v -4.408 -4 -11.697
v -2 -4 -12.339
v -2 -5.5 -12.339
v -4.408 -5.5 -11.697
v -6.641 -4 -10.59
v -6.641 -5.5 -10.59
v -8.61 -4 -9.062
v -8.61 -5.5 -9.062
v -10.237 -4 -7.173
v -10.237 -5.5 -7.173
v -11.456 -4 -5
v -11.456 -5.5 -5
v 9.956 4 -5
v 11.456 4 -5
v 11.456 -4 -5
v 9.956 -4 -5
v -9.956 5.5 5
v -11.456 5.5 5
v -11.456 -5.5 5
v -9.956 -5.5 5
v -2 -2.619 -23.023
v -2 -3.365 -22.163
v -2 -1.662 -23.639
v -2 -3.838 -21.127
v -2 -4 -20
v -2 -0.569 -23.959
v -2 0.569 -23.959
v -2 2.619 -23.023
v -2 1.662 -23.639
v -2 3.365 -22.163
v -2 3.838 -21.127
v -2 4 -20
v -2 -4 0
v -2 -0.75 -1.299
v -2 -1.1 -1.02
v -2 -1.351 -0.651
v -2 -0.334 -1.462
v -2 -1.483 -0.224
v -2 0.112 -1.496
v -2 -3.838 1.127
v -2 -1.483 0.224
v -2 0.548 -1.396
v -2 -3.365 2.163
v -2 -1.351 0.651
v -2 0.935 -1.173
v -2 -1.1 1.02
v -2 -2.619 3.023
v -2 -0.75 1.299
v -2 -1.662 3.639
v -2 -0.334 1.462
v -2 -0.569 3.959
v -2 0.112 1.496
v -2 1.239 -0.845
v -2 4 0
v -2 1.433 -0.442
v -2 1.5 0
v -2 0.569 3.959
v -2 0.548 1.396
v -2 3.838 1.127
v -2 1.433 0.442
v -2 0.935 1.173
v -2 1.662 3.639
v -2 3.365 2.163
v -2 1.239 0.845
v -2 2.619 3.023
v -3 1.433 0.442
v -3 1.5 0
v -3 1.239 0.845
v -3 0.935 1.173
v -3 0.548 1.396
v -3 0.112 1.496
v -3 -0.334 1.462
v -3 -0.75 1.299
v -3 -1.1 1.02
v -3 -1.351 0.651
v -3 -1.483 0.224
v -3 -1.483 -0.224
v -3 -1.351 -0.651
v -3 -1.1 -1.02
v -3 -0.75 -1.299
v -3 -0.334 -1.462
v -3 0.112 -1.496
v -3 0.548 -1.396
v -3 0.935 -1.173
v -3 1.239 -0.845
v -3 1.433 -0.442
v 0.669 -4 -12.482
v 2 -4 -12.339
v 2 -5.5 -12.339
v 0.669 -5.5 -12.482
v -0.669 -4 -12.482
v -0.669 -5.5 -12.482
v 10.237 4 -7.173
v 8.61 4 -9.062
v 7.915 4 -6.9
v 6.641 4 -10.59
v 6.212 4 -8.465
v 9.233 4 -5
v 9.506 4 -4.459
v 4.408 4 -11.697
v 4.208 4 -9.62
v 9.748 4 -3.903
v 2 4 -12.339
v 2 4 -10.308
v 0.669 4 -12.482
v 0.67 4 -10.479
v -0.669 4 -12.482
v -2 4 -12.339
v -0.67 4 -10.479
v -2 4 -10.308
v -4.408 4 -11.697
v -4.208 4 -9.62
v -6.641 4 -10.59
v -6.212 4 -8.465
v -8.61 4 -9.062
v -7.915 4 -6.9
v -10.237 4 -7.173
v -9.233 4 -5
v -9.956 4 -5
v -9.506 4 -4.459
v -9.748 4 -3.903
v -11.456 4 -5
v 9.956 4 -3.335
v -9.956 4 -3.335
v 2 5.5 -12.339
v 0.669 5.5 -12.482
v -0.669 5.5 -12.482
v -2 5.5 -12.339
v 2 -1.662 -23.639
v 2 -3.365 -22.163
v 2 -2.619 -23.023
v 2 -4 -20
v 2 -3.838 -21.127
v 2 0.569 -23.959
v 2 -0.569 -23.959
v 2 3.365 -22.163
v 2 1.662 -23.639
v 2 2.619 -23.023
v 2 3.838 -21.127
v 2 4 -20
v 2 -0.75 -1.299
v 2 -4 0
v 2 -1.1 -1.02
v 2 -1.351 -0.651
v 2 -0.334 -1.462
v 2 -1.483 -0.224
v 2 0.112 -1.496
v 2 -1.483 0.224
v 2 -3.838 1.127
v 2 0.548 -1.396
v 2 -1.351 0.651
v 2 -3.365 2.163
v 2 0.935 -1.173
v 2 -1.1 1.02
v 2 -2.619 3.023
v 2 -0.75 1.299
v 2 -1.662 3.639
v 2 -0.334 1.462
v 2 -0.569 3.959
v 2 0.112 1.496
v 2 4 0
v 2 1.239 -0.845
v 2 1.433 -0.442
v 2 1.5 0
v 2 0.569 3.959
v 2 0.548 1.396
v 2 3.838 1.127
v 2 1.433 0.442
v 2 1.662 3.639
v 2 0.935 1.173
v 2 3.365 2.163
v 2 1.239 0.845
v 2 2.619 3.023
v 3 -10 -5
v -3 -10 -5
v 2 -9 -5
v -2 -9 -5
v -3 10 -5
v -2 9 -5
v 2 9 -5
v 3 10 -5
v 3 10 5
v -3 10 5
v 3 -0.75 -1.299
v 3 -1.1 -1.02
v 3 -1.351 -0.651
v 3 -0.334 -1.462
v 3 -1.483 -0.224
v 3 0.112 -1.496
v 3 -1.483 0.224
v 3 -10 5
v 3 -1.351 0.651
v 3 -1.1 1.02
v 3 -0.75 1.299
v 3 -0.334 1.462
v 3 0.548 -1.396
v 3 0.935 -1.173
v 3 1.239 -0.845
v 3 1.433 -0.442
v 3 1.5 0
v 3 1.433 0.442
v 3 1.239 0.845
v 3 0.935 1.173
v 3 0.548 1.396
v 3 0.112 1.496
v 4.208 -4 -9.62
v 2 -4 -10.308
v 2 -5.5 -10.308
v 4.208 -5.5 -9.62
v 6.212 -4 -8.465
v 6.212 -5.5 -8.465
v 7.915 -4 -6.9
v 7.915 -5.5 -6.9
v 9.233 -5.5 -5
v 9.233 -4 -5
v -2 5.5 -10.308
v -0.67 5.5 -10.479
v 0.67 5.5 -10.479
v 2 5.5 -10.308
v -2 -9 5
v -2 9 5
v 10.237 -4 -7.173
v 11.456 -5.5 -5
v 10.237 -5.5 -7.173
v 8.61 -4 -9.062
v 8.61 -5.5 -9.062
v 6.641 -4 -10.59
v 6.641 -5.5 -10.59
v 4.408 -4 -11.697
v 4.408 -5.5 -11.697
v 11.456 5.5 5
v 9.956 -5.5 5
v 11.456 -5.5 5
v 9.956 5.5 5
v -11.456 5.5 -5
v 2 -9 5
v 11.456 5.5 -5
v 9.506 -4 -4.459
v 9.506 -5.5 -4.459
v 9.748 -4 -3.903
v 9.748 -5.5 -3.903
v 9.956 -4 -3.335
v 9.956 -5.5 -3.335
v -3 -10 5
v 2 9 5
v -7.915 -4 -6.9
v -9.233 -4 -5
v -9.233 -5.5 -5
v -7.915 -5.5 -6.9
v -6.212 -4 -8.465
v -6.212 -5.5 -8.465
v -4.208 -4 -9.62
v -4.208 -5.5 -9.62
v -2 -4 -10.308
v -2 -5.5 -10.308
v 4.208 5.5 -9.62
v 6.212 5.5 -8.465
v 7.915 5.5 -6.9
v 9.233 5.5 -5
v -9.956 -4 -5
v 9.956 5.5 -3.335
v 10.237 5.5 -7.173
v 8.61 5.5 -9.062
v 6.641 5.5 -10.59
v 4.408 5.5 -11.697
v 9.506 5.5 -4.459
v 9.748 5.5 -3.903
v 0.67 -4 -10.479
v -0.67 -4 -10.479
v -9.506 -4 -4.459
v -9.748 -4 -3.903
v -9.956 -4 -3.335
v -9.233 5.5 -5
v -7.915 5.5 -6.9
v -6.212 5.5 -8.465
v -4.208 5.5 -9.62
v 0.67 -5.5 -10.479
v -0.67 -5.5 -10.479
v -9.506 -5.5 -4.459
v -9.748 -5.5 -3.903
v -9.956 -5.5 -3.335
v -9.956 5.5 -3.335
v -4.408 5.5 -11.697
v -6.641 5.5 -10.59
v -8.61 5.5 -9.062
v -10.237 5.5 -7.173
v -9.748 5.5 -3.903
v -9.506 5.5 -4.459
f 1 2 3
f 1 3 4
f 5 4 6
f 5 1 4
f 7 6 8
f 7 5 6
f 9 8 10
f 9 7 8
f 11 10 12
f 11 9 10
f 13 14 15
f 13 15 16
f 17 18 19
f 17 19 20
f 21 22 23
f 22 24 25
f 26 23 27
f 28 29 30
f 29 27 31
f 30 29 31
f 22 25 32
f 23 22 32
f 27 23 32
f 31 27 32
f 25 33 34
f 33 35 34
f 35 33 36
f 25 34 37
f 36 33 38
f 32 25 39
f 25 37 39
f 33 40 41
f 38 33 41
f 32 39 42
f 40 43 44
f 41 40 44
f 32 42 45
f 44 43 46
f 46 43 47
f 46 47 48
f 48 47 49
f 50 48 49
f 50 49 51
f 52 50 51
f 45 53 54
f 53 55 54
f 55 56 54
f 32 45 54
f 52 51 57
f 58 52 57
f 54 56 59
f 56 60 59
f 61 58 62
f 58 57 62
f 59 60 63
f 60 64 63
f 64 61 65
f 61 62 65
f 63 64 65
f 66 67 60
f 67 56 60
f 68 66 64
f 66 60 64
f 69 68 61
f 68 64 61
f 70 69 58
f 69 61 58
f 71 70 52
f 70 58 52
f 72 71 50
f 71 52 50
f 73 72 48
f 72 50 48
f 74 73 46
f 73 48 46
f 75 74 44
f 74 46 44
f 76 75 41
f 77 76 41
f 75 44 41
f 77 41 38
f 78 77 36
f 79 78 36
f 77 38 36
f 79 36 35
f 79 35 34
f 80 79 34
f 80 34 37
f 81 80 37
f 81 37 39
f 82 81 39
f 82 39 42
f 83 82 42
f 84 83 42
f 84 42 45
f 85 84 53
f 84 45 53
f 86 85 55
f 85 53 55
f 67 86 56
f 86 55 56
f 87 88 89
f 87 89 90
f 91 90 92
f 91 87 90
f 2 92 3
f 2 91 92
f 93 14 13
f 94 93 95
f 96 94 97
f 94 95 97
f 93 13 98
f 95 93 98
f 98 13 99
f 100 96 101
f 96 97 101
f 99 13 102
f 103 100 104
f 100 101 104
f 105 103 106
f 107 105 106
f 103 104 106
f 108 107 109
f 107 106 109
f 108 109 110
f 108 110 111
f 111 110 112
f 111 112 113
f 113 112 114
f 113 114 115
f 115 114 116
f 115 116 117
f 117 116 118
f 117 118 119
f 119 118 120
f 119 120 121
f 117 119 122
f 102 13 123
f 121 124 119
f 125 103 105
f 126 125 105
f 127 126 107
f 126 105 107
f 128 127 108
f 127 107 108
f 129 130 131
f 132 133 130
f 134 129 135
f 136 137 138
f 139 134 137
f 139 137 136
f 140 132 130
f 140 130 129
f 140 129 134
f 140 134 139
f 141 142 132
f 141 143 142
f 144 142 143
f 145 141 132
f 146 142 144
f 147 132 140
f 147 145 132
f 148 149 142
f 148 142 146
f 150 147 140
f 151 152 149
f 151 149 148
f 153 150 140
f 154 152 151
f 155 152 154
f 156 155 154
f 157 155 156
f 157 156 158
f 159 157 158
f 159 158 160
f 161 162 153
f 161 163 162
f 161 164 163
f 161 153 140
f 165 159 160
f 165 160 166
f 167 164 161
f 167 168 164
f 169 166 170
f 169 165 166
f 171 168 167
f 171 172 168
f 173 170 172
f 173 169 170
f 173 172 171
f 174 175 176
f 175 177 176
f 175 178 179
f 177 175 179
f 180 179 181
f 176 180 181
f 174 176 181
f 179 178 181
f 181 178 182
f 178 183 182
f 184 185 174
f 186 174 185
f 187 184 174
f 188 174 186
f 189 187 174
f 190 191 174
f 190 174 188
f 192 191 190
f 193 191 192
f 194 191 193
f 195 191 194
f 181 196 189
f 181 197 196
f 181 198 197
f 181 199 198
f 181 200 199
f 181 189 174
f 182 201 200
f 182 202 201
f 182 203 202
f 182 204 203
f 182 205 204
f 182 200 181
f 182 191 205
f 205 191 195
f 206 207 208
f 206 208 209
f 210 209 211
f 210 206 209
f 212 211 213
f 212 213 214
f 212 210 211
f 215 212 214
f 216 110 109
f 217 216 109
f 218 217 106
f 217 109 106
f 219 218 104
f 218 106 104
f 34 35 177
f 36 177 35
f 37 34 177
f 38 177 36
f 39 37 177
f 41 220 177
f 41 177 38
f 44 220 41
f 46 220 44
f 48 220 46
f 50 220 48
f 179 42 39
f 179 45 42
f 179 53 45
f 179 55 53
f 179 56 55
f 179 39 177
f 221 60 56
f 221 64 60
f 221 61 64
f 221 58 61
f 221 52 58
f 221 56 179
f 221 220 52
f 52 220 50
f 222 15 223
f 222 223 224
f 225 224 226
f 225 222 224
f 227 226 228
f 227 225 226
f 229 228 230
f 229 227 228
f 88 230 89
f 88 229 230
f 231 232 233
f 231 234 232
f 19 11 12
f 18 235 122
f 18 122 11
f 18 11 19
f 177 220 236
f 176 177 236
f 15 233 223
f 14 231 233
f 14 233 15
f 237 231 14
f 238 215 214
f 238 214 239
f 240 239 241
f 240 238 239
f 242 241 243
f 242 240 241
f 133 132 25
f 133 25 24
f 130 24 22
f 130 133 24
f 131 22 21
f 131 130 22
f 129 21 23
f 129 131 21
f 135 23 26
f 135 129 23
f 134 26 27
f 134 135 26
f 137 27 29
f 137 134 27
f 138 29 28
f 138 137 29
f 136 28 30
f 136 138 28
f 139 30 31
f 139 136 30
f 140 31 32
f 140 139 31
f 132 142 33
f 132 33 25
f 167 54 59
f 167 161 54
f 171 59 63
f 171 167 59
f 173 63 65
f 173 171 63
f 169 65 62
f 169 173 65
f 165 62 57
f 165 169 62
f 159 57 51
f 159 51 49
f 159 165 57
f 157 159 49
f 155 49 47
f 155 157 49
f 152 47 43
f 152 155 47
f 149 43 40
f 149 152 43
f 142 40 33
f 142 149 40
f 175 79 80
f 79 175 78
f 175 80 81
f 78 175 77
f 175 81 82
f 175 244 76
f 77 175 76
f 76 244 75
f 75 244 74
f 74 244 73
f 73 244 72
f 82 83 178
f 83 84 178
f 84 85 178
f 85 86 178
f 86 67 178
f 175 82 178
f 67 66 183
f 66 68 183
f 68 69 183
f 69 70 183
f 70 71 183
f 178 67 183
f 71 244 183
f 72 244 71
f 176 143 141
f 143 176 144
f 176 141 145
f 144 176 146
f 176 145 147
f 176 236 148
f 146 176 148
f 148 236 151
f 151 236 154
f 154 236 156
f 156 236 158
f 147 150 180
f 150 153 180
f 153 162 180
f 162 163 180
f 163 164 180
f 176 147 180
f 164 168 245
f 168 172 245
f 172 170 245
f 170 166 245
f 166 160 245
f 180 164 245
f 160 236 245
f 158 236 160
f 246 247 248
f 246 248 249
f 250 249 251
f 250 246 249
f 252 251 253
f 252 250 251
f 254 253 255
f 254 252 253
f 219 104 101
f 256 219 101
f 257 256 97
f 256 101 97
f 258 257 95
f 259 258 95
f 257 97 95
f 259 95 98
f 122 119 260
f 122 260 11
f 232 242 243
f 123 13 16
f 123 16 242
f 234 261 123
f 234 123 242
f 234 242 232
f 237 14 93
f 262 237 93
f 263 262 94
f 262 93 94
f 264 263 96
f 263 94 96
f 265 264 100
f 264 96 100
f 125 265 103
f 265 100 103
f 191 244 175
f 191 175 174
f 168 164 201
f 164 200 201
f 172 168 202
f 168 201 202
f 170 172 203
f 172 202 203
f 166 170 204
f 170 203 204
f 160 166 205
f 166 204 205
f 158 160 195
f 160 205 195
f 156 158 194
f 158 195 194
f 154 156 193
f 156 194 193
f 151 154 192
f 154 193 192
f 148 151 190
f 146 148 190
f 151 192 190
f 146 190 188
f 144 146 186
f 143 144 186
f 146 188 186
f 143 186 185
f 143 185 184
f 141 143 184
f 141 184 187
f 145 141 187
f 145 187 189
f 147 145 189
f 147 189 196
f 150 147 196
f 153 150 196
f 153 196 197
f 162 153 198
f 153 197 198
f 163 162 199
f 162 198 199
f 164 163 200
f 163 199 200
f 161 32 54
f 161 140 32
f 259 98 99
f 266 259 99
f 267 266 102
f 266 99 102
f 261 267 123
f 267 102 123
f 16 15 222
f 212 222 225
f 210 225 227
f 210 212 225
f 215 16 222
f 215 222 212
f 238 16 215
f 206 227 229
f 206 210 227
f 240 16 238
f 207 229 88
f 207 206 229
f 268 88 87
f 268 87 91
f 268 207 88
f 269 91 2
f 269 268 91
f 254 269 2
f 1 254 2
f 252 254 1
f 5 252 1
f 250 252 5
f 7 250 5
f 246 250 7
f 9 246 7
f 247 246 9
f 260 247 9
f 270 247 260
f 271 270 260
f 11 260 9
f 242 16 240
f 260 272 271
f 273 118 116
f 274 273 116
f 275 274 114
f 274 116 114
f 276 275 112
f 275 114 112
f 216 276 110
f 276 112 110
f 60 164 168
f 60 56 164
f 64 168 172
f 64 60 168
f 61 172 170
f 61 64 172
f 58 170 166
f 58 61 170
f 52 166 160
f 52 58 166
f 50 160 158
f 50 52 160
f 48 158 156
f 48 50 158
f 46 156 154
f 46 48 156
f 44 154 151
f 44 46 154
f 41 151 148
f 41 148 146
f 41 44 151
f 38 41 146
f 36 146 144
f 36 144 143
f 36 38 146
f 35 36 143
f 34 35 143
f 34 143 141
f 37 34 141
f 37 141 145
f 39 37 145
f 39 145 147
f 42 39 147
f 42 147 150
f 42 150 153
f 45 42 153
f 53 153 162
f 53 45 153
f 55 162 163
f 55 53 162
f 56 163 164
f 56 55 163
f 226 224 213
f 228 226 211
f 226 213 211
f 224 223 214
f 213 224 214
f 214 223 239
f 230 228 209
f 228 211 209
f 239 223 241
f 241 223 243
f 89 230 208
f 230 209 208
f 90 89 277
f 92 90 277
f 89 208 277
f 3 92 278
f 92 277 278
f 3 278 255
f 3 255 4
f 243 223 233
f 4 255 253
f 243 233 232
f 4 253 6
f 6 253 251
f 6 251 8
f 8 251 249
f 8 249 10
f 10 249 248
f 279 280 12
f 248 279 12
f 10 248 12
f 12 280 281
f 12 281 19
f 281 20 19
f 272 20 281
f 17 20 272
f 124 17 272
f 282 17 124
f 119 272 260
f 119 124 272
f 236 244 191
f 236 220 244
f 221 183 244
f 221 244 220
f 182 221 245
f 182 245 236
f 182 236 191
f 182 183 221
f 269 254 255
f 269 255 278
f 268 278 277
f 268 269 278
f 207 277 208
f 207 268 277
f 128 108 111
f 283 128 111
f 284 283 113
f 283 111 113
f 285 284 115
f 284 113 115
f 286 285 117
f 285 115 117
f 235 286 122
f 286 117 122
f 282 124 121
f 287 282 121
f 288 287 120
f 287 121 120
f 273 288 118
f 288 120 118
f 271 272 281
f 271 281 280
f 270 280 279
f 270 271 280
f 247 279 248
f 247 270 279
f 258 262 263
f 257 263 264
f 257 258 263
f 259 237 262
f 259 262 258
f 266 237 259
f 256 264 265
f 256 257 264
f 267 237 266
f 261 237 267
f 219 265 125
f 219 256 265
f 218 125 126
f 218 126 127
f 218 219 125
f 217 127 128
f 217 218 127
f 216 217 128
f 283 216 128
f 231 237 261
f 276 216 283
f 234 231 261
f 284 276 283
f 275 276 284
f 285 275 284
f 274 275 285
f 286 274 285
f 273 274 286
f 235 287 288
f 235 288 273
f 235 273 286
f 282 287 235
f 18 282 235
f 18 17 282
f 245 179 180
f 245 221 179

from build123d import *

# Parameters (mm, degrees)
F0_R     = 1.5
F1_DEPTH = 2
F2_W     = 6
F2_H     = 20
F2_W_2   = 4
F2_H_2   = 18
F3_DEPTH = 5
F4_DEPTH = 12.5
F6_DEPTH = 1.5
F7_DEPTH = 8
F8_START = -8
F8_DEPTH = 1.5


# Not quite as in the source:
# - a feature names something its author has since deleted; it is built from what else it names


with BuildPart() as f1:
    # F0 (on Right) → F1 (new body, symmetric)
    with BuildSketch(Plane.YZ):
        with BuildLine():
            ThreePointArc((-4, 0), (0, -4), (4, 0))
            ThreePointArc((4, 0), (0, 4), (-4, 0))
        make_face()
        Circle(F0_R, mode=Mode.SUBTRACT)
        with BuildLine():
            Line((4, -20), (4, 0))
            ThreePointArc((4, 0), (0, -4), (-4, 0))
            Line((-4, 0), (-4, -20))
            ThreePointArc((-4, -20), (0, -16), (4, -20))
        make_face()
        with BuildLine():
            ThreePointArc((-4, -20), (0, -24), (4, -20))
            ThreePointArc((4, -20), (0, -16), (-4, -20))
        make_face()
    extrude(amount=F1_DEPTH, both=True)


with BuildPart() as f3:
    # F2 (on Top) → F3 (new body, symmetric)
    with BuildSketch(Plane.XY):
        Rectangle(F2_W, F2_H)
        Rectangle(F2_W_2, F2_H_2, mode=Mode.SUBTRACT)
    extrude(amount=F3_DEPTH, both=True)

    # F0 (on Right) → F4 (cut, symmetric)
    with BuildSketch(Plane.YZ):
        Circle(F0_R)
    extrude(amount=F4_DEPTH, both=True, mode=Mode.SUBTRACT)


with BuildPart() as f6:
    # F5 (on face) → F6 (new body)
    with BuildSketch(Plane(origin=(0, 4, 0), x_dir=(-1, 0, 0), z_dir=(0, 1, 0))):
        with BuildLine():
            ThreePointArc((-9.9564392374, -3.3345640963), (-10.5, 0), (-9.9564392374, 3.3345640963))
            Line((-9.9564392374, 3.3345640963), (-9.9564392374, 5))
            Line((-9.9564392374, 5), (-11.4564392374, 5))
            Line((-11.4564392374, 5), (-11.4564392374, -5))
            Line((-11.4564392374, -5), (-9.9564392374, -5))
            Line((-9.9564392374, -5), (-9.9564392374, -3.3345640963))
        make_face()
        with BuildLine():
            Line((2, -12.3389626793), (2, -10.307764064))
            ThreePointArc((2, -10.307764064), (0, -10.5), (-2, -10.307764064))
            Line((-2, -10.307764064), (-2, -12.3389626793))
            ThreePointArc((-2, -12.3389626793), (0, -12.5), (2, -12.3389626793))
        make_face()
        with BuildLine():
            ThreePointArc((9.9564392374, 3.3345640963), (10.3632189013, 1.6892880168), (10.5, 0))
            ThreePointArc((10.5, 0), (10.3632189013, -1.6892880168), (9.9564392374, -3.3345640963))
            Line((9.9564392374, -3.3345640963), (9.9564392374, -5))
            Line((9.9564392374, -5), (11.4564392374, -5))
            Line((11.4564392374, -5), (11.4564392374, 5))
            Line((11.4564392374, 5), (9.9564392374, 5))
            Line((9.9564392374, 5), (9.9564392374, 3.3345640963))
        make_face()
        with BuildLine():
            ThreePointArc((9.9564392374, -3.3345640963), (10.3632189013, -1.6892880168), (10.5, 0))
            ThreePointArc((10.5, 0), (10.3632189013, 1.6892880168), (9.9564392374, 3.3345640963))
            Line((9.9564392374, 3.3345640963), (9.9564392374, -3.3345640963))
        make_face()
        with BuildLine():
            Line((9.9564392374, -5), (9.2330926563, -5))
            ThreePointArc((9.2330926563, -5), (6.2119789517, -8.4653007923), (2, -10.307764064))
            Line((2, -10.307764064), (2, -12.3389626793))
            ThreePointArc((2, -12.3389626793), (7.6638131853, -9.8750173398), (11.4564392374, -5))
            Line((11.4564392374, -5), (9.9564392374, -5))
        make_face()
        with BuildLine():
            Line((-2, -12.3389626793), (-2, -10.307764064))
            ThreePointArc((-2, -10.307764064), (-6.2119789517, -8.4653007923), (-9.2330926563, -5))
            Line((-9.2330926563, -5), (-9.9564392374, -5))
            Line((-9.9564392374, -5), (-11.4564392374, -5))
            ThreePointArc((-11.4564392374, -5), (-7.6638131853, -9.8750173398), (-2, -12.3389626793))
        make_face()
        with BuildLine():
            ThreePointArc((-9.2330926563, -5), (-9.6308334407, -4.1829471952), (-9.9564392374, -3.3345640963))
            Line((-9.9564392374, -3.3345640963), (-9.9564392374, -5))
            Line((-9.9564392374, -5), (-9.2330926563, -5))
        make_face()
        with BuildLine():
            Line((-9.9564392374, -3.3345640963), (-9.9564392374, 3.3345640963))
            ThreePointArc((-9.9564392374, 3.3345640963), (-10.5, 0), (-9.9564392374, -3.3345640963))
        make_face()
        with BuildLine():
            Line((9.9564392374, -5), (9.9564392374, -3.3345640963))
            ThreePointArc((9.9564392374, -3.3345640963), (9.6308334407, -4.1829471952), (9.2330926563, -5))
            Line((9.2330926563, -5), (9.9564392374, -5))
        make_face()
    extrude(amount=F6_DEPTH)

    # F5 (on face) → F7 (join, through all)
    with BuildSketch(Plane(origin=(0, 4, 0), x_dir=(-1, 0, 0), z_dir=(0, 1, 0))):
        with BuildLine():
            ThreePointArc((9.9564392374, 3.3345640963), (10.3632189013, 1.6892880168), (10.5, 0))
            ThreePointArc((10.5, 0), (10.3632189013, -1.6892880168), (9.9564392374, -3.3345640963))
            Line((9.9564392374, -3.3345640963), (9.9564392374, -5))
            Line((9.9564392374, -5), (11.4564392374, -5))
            Line((11.4564392374, -5), (11.4564392374, 5))
            Line((11.4564392374, 5), (9.9564392374, 5))
            Line((9.9564392374, 5), (9.9564392374, 3.3345640963))
        make_face()
        with BuildLine():
            ThreePointArc((-9.9564392374, -3.3345640963), (-10.5, 0), (-9.9564392374, 3.3345640963))
            Line((-9.9564392374, 3.3345640963), (-9.9564392374, 5))
            Line((-9.9564392374, 5), (-11.4564392374, 5))
            Line((-11.4564392374, 5), (-11.4564392374, -5))
            Line((-11.4564392374, -5), (-9.9564392374, -5))
            Line((-9.9564392374, -5), (-9.9564392374, -3.3345640963))
        make_face()
        with BuildLine():
            ThreePointArc((9.9564392374, -3.3345640963), (10.3632189013, -1.6892880168), (10.5, 0))
            ThreePointArc((10.5, 0), (10.3632189013, 1.6892880168), (9.9564392374, 3.3345640963))
            Line((9.9564392374, 3.3345640963), (9.9564392374, -3.3345640963))
        make_face()
        with BuildLine():
            Line((-9.9564392374, -3.3345640963), (-9.9564392374, 3.3345640963))
            ThreePointArc((-9.9564392374, 3.3345640963), (-10.5, 0), (-9.9564392374, -3.3345640963))
        make_face()
    extrude(amount=-F7_DEPTH)

    # F5 (on face) → F8 (join)
    with BuildSketch(Plane(origin=(0, 4, 0), x_dir=(-1, 0, 0), z_dir=(0, 1, 0)).offset(F8_START)):
        with BuildLine():
            ThreePointArc((-9.9564392374, -3.3345640963), (-10.5, 0), (-9.9564392374, 3.3345640963))
            Line((-9.9564392374, 3.3345640963), (-9.9564392374, 5))
            Line((-9.9564392374, 5), (-11.4564392374, 5))
            Line((-11.4564392374, 5), (-11.4564392374, -5))
            Line((-11.4564392374, -5), (-9.9564392374, -5))
            Line((-9.9564392374, -5), (-9.9564392374, -3.3345640963))
        make_face()
        with BuildLine():
            ThreePointArc((9.9564392374, 3.3345640963), (10.3632189013, 1.6892880168), (10.5, 0))
            ThreePointArc((10.5, 0), (10.3632189013, -1.6892880168), (9.9564392374, -3.3345640963))
            Line((9.9564392374, -3.3345640963), (9.9564392374, -5))
            Line((9.9564392374, -5), (11.4564392374, -5))
            Line((11.4564392374, -5), (11.4564392374, 5))
            Line((11.4564392374, 5), (9.9564392374, 5))
            Line((9.9564392374, 5), (9.9564392374, 3.3345640963))
        make_face()
        with BuildLine():
            Line((9.9564392374, -5), (9.2330926563, -5))
            ThreePointArc((9.2330926563, -5), (6.2119789517, -8.4653007923), (2, -10.307764064))
            Line((2, -10.307764064), (2, -12.3389626793))
            ThreePointArc((2, -12.3389626793), (7.6638131853, -9.8750173398), (11.4564392374, -5))
            Line((11.4564392374, -5), (9.9564392374, -5))
        make_face()
        with BuildLine():
            Line((-2, -12.3389626793), (-2, -10.307764064))
            ThreePointArc((-2, -10.307764064), (-6.2119789517, -8.4653007923), (-9.2330926563, -5))
            Line((-9.2330926563, -5), (-9.9564392374, -5))
            Line((-9.9564392374, -5), (-11.4564392374, -5))
            ThreePointArc((-11.4564392374, -5), (-7.6638131853, -9.8750173398), (-2, -12.3389626793))
        make_face()
        with BuildLine():
            Line((2, -12.3389626793), (2, -10.307764064))
            ThreePointArc((2, -10.307764064), (0, -10.5), (-2, -10.307764064))
            Line((-2, -10.307764064), (-2, -12.3389626793))
            ThreePointArc((-2, -12.3389626793), (0, -12.5), (2, -12.3389626793))
        make_face()
        with BuildLine():
            ThreePointArc((9.9564392374, -3.3345640963), (10.3632189013, -1.6892880168), (10.5, 0))
            ThreePointArc((10.5, 0), (10.3632189013, 1.6892880168), (9.9564392374, 3.3345640963))
            Line((9.9564392374, 3.3345640963), (9.9564392374, -3.3345640963))
        make_face()
        with BuildLine():
            Line((-9.9564392374, -3.3345640963), (-9.9564392374, 3.3345640963))
            ThreePointArc((-9.9564392374, 3.3345640963), (-10.5, 0), (-9.9564392374, -3.3345640963))
        make_face()
        with BuildLine():
            Line((9.9564392374, -5), (9.9564392374, -3.3345640963))
            ThreePointArc((9.9564392374, -3.3345640963), (9.6308334407, -4.1829471952), (9.2330926563, -5))
            Line((9.2330926563, -5), (9.9564392374, -5))
        make_face()
        with BuildLine():
            ThreePointArc((-9.2330926563, -5), (-9.6308334407, -4.1829471952), (-9.9564392374, -3.3345640963))
            Line((-9.9564392374, -3.3345640963), (-9.9564392374, -5))
            Line((-9.9564392374, -5), (-9.2330926563, -5))
        make_face()
    extrude(amount=-F8_DEPTH)


solid = Compound([f1.part, f3.part, f6.part])
